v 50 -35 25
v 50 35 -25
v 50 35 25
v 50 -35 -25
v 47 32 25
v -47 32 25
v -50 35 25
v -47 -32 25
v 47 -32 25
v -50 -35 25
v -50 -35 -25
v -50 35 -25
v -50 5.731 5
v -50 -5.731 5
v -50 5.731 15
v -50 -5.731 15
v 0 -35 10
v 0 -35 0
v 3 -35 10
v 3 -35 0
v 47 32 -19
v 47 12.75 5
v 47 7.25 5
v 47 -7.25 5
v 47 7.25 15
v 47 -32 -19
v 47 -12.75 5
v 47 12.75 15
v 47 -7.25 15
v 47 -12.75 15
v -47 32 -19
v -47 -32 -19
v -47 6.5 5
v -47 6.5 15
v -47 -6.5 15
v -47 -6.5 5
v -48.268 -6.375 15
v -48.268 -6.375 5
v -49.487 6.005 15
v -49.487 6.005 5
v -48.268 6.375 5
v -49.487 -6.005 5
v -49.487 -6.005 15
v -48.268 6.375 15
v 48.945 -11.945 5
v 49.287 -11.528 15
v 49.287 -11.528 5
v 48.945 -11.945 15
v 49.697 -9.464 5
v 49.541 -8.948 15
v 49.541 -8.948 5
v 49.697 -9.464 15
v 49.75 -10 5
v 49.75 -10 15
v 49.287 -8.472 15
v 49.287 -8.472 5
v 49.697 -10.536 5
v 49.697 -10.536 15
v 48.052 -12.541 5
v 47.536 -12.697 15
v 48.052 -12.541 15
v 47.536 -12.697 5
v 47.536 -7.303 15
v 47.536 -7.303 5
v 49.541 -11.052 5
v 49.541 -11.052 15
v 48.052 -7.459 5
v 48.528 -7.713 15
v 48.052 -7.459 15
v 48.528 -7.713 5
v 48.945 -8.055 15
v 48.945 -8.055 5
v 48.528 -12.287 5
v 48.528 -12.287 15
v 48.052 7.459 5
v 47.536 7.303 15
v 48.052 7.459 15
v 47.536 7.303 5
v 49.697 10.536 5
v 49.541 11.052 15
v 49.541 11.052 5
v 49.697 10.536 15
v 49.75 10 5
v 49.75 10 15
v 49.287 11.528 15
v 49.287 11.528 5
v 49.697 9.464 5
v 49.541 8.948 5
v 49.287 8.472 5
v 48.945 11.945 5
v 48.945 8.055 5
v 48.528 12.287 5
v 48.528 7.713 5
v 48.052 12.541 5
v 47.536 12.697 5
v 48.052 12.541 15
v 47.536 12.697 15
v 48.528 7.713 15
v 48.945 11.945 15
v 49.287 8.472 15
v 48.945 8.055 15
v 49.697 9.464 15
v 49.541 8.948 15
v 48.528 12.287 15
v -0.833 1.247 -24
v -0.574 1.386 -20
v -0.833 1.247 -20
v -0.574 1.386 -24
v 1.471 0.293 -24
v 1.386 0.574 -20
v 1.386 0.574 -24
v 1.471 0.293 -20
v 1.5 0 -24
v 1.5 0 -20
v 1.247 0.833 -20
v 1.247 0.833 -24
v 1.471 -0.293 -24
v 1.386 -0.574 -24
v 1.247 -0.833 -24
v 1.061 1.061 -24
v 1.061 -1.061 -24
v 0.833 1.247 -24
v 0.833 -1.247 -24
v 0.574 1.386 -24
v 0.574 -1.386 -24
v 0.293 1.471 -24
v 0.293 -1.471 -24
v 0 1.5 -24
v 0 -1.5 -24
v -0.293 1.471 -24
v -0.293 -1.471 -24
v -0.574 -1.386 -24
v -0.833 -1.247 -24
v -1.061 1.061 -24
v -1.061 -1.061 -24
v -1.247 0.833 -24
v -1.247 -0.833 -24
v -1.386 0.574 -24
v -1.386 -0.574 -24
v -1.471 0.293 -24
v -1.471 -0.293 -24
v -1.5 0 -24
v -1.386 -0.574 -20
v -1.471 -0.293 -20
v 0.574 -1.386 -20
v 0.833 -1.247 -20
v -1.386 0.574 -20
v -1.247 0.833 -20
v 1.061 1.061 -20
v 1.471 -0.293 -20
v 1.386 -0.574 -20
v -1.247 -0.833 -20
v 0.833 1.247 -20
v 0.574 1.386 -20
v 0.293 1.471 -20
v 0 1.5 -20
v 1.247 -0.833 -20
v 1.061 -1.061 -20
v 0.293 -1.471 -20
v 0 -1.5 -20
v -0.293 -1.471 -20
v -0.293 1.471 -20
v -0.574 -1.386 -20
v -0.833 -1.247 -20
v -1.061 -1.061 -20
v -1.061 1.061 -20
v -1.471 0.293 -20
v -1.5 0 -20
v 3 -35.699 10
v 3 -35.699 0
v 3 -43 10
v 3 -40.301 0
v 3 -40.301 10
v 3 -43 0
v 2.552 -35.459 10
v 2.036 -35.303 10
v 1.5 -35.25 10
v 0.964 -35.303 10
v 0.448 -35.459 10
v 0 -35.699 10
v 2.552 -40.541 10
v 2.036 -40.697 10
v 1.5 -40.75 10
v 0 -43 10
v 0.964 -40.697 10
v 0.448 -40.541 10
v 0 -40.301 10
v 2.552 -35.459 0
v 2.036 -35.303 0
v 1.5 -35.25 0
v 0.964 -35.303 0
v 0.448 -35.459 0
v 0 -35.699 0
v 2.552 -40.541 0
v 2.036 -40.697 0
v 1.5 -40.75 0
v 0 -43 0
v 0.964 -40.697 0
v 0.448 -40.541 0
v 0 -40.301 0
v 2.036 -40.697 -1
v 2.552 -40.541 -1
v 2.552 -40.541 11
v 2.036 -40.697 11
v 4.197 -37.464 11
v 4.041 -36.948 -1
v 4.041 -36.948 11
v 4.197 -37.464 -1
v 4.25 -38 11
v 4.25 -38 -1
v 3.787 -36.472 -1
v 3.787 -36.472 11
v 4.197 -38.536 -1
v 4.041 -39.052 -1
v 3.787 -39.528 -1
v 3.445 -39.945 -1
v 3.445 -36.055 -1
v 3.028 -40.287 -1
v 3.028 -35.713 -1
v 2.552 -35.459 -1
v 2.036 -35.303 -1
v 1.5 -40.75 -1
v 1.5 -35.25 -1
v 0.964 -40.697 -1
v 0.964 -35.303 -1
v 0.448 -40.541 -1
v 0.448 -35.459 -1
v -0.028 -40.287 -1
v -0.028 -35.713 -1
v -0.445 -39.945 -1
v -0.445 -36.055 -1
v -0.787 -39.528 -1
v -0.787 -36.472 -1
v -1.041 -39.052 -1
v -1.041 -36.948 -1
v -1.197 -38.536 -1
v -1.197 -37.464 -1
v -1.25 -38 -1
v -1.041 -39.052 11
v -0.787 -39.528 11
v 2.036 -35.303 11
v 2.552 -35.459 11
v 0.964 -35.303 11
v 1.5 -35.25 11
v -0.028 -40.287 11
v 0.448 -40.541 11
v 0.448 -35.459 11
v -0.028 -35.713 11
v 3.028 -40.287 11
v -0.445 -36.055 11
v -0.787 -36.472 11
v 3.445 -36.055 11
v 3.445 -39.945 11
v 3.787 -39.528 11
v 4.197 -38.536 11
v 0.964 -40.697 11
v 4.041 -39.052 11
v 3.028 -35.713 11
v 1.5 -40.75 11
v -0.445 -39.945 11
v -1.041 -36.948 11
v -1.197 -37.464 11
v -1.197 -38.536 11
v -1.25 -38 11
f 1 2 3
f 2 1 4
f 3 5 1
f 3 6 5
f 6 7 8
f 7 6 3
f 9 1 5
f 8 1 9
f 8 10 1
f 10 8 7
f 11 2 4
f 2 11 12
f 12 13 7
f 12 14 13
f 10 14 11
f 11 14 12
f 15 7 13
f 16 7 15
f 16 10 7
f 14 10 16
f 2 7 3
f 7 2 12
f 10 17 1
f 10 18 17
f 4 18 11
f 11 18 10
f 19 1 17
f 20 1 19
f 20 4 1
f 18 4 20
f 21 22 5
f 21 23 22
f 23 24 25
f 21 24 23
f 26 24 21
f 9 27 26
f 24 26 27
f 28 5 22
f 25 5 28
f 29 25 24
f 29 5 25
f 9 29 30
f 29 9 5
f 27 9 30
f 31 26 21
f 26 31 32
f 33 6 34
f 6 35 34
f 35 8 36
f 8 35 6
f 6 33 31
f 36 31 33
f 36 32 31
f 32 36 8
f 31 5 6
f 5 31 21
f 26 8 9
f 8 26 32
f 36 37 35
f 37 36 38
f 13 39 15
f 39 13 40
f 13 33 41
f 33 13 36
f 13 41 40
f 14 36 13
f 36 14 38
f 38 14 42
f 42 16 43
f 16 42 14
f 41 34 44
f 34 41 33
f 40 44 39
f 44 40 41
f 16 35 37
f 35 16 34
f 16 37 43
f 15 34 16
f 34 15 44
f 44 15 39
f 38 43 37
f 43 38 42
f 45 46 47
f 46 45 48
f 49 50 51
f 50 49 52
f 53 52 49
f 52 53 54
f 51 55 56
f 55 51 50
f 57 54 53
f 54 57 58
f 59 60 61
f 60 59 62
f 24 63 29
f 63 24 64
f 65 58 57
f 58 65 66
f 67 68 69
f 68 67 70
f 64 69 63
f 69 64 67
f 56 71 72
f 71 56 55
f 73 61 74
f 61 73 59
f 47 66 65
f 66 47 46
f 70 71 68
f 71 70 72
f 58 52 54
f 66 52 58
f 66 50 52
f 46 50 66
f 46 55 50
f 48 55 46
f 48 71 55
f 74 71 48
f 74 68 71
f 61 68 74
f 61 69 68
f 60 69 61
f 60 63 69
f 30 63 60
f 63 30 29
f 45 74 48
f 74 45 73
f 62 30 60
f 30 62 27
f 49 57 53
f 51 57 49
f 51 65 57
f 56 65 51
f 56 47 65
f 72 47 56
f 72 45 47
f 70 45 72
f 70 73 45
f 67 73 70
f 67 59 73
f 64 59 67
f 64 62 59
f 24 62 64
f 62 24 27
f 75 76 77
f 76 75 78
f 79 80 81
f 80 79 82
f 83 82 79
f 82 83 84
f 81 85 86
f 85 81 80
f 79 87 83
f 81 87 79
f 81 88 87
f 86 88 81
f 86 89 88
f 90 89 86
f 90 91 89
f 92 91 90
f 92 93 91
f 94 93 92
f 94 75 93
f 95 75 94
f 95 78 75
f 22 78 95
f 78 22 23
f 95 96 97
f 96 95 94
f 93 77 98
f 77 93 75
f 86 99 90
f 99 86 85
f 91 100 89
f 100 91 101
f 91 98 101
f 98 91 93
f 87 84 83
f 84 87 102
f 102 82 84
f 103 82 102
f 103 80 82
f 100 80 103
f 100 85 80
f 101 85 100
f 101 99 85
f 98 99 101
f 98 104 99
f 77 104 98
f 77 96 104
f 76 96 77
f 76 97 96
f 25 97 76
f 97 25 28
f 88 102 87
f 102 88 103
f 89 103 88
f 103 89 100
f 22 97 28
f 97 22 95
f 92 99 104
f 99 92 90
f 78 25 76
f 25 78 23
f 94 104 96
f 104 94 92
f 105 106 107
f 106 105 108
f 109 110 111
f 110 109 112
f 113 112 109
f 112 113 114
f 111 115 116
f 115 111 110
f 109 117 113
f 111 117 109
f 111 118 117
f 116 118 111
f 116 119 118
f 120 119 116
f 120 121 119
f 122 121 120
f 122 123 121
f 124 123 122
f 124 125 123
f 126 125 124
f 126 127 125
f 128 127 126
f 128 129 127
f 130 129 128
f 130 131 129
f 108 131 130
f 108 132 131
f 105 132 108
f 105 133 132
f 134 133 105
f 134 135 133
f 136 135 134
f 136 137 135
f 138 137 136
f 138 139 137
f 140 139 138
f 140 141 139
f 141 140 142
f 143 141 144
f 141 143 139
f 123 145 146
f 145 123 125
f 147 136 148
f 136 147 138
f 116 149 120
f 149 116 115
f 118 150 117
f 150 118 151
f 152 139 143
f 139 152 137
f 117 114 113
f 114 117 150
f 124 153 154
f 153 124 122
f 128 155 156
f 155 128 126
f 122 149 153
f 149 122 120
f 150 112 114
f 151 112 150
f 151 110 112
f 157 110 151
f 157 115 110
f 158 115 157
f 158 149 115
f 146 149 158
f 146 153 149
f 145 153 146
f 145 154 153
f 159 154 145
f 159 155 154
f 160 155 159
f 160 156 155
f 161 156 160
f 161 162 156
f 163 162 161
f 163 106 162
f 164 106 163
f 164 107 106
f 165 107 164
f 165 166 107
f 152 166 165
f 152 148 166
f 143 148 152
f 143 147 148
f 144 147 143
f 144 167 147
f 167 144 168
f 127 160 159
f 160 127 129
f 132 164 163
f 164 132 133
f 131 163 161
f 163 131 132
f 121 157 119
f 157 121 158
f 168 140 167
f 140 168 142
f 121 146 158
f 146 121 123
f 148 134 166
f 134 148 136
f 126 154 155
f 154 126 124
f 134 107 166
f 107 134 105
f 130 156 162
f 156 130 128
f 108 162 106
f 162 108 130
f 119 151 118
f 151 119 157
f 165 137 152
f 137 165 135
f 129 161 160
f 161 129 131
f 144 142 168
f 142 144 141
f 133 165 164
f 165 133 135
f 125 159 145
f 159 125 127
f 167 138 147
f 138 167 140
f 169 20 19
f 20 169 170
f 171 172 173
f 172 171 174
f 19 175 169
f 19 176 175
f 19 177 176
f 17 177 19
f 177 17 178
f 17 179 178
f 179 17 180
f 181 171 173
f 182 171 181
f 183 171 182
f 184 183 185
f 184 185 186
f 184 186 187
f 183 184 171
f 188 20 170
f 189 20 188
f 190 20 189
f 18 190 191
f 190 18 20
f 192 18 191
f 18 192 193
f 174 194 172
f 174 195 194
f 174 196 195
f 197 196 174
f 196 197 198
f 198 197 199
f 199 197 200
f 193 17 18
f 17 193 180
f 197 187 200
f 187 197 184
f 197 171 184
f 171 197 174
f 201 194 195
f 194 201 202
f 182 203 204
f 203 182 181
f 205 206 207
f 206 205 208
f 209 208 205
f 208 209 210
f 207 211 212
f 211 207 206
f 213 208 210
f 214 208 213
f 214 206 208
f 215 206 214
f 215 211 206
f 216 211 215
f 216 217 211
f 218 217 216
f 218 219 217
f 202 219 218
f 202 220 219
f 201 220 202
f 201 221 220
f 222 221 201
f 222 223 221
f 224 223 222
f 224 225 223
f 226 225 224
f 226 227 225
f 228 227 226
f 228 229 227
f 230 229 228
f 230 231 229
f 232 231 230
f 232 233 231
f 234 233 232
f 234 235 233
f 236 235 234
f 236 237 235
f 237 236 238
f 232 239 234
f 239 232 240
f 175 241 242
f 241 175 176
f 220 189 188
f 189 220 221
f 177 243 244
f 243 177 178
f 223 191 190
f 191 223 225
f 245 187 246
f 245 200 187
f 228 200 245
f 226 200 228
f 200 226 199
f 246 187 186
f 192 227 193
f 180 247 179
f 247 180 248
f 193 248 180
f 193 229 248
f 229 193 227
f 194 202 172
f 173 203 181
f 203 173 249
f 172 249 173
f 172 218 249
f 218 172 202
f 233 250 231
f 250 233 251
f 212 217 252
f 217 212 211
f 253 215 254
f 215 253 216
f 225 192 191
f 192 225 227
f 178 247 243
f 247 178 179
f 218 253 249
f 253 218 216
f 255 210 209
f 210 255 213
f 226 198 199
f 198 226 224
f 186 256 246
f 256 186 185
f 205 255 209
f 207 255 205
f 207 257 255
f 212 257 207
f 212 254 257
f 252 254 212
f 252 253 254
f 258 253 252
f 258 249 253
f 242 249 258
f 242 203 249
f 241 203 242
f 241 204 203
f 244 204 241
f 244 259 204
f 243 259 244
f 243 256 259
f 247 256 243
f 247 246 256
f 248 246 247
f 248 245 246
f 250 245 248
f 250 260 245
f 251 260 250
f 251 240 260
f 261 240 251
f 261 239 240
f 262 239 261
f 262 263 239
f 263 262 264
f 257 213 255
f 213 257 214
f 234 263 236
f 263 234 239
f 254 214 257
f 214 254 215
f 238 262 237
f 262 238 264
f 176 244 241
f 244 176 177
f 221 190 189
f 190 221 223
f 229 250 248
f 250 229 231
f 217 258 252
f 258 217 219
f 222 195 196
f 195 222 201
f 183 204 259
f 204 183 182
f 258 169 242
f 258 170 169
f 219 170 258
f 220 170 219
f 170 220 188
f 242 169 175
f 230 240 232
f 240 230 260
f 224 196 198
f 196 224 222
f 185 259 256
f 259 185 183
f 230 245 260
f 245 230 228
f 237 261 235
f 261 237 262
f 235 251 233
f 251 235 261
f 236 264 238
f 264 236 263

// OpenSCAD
// EFHW UNUN COMPACT ENCLOSURE — FDM 3D-PRINTABLE
// Purpose: Mid-size enclosure for EFHW 49:1 unun
// Dimensions: 100×70×50 mm
// Features: SO-239 (coax feed), 2× binding posts (antenna input), internal divider
// Material: PETG recommended
// Print time: ~3–4 hours
// Filament: ~40–55 grams

$fn = 32;

// External dimensions
box_l = 100;
box_w = 70;
box_h = 50;
wall = 3;

// Internal cavity
cav_l = box_l - 2*wall;
cav_w = box_w - 2*wall;
cav_h = box_h - 2*wall;

// SO-239 connector hole
so239_hole = 13.0;

// Binding post hole diameter (banana plug or M4 stud)
binding_hole = 5.5;

// Internal divider (separates primary/secondary windings)
divider_thickness = 2;

module base_box() {
    difference() {
        // Outer envelope
        cube([box_l, box_w, box_h], center=true);

        // Internal cavity
        translate([0, 0, wall])
            cube([cav_l, cav_w, cav_h], center=true);

        // SO-239 hole (front, coax output)
        translate([-box_l/2 + wall, 0, box_h/2 - 15])
            cylinder(h=10, r=so239_hole/2, center=true);

        // Binding post holes (rear, antenna input, left)
        translate([box_l/2 - wall, -10, box_h/2 - 15])
            cylinder(h=10, r=binding_hole/2, center=true);

        // Binding post hole (rear, antenna input, right)
        translate([box_l/2 - wall, 10, box_h/2 - 15])
            cylinder(h=10, r=binding_hole/2, center=true);

        // Drain hole (bottom)
        translate([0, 0, -box_h/2 + wall])
            cylinder(h=wall+1, r=1.5, center=true);
    }
}

module internal_divider() {
    // Separates primary coil area from secondary coil area
    translate([0, 0, 0])
        cube([divider_thickness, box_w - 2*wall - 4, cav_h - 4], center=true);
}

module reinforcement_pads() {
    // Extra material around binding post holes (strengthen weak areas)
    for(pos_y=[-10, 10]) {
        translate([box_l/2 - wall - 5, pos_y, box_h/2 - 15])
            cube([3, 8, 6], center=true);
    }
}

module mounting_tab() {
    // Single tab for mast mounting
    translate([0, -box_w/2 - 8, 0]) {
        cube([3, 10, 10], center=false);
        // M5 bolt hole
        translate([1.5, 5, 5])
            cylinder(h=12, r=2.75, center=true);
    }
}

module lid() {
    difference() {
        cube([box_l - 2*wall - 2, box_w - 2*wall - 2, 3], center=true);
        // Slight depression for gasket seating
        translate([0, 0, -0.5])
            cube([box_l - 2*wall - 6, box_w - 2*wall - 6, 1.5], center=true);
    }
}

// ASSEMBLY
base_box();
mounting_tab();
// reinforcement_pads();  // Uncomment if desired

// Uncomment to show lid:
// translate([0, 0, box_h/2 + 3])
//     lid();

// PRINTING & ASSEMBLY NOTES:
// 1. Print base in standard orientation (SO-239 facing front)
// 2. Print lid separately
// 3. Installation:
//    - SO-239 connector to front (solder coax output)
//    - Binding posts to rear (solder antenna primary wires)
//    - Internal: FT-240-43 (3:21 turns) mounted on base
//    - Potting: Optional (silicone recommended for thermal stability)
// 4. Weatherproofing:
//    - Paint exterior (UV-resistant coating)
//    - Silicone caulk around lid (creates water seal)
//    - Install O-ring if potting (prevents air pockets)
